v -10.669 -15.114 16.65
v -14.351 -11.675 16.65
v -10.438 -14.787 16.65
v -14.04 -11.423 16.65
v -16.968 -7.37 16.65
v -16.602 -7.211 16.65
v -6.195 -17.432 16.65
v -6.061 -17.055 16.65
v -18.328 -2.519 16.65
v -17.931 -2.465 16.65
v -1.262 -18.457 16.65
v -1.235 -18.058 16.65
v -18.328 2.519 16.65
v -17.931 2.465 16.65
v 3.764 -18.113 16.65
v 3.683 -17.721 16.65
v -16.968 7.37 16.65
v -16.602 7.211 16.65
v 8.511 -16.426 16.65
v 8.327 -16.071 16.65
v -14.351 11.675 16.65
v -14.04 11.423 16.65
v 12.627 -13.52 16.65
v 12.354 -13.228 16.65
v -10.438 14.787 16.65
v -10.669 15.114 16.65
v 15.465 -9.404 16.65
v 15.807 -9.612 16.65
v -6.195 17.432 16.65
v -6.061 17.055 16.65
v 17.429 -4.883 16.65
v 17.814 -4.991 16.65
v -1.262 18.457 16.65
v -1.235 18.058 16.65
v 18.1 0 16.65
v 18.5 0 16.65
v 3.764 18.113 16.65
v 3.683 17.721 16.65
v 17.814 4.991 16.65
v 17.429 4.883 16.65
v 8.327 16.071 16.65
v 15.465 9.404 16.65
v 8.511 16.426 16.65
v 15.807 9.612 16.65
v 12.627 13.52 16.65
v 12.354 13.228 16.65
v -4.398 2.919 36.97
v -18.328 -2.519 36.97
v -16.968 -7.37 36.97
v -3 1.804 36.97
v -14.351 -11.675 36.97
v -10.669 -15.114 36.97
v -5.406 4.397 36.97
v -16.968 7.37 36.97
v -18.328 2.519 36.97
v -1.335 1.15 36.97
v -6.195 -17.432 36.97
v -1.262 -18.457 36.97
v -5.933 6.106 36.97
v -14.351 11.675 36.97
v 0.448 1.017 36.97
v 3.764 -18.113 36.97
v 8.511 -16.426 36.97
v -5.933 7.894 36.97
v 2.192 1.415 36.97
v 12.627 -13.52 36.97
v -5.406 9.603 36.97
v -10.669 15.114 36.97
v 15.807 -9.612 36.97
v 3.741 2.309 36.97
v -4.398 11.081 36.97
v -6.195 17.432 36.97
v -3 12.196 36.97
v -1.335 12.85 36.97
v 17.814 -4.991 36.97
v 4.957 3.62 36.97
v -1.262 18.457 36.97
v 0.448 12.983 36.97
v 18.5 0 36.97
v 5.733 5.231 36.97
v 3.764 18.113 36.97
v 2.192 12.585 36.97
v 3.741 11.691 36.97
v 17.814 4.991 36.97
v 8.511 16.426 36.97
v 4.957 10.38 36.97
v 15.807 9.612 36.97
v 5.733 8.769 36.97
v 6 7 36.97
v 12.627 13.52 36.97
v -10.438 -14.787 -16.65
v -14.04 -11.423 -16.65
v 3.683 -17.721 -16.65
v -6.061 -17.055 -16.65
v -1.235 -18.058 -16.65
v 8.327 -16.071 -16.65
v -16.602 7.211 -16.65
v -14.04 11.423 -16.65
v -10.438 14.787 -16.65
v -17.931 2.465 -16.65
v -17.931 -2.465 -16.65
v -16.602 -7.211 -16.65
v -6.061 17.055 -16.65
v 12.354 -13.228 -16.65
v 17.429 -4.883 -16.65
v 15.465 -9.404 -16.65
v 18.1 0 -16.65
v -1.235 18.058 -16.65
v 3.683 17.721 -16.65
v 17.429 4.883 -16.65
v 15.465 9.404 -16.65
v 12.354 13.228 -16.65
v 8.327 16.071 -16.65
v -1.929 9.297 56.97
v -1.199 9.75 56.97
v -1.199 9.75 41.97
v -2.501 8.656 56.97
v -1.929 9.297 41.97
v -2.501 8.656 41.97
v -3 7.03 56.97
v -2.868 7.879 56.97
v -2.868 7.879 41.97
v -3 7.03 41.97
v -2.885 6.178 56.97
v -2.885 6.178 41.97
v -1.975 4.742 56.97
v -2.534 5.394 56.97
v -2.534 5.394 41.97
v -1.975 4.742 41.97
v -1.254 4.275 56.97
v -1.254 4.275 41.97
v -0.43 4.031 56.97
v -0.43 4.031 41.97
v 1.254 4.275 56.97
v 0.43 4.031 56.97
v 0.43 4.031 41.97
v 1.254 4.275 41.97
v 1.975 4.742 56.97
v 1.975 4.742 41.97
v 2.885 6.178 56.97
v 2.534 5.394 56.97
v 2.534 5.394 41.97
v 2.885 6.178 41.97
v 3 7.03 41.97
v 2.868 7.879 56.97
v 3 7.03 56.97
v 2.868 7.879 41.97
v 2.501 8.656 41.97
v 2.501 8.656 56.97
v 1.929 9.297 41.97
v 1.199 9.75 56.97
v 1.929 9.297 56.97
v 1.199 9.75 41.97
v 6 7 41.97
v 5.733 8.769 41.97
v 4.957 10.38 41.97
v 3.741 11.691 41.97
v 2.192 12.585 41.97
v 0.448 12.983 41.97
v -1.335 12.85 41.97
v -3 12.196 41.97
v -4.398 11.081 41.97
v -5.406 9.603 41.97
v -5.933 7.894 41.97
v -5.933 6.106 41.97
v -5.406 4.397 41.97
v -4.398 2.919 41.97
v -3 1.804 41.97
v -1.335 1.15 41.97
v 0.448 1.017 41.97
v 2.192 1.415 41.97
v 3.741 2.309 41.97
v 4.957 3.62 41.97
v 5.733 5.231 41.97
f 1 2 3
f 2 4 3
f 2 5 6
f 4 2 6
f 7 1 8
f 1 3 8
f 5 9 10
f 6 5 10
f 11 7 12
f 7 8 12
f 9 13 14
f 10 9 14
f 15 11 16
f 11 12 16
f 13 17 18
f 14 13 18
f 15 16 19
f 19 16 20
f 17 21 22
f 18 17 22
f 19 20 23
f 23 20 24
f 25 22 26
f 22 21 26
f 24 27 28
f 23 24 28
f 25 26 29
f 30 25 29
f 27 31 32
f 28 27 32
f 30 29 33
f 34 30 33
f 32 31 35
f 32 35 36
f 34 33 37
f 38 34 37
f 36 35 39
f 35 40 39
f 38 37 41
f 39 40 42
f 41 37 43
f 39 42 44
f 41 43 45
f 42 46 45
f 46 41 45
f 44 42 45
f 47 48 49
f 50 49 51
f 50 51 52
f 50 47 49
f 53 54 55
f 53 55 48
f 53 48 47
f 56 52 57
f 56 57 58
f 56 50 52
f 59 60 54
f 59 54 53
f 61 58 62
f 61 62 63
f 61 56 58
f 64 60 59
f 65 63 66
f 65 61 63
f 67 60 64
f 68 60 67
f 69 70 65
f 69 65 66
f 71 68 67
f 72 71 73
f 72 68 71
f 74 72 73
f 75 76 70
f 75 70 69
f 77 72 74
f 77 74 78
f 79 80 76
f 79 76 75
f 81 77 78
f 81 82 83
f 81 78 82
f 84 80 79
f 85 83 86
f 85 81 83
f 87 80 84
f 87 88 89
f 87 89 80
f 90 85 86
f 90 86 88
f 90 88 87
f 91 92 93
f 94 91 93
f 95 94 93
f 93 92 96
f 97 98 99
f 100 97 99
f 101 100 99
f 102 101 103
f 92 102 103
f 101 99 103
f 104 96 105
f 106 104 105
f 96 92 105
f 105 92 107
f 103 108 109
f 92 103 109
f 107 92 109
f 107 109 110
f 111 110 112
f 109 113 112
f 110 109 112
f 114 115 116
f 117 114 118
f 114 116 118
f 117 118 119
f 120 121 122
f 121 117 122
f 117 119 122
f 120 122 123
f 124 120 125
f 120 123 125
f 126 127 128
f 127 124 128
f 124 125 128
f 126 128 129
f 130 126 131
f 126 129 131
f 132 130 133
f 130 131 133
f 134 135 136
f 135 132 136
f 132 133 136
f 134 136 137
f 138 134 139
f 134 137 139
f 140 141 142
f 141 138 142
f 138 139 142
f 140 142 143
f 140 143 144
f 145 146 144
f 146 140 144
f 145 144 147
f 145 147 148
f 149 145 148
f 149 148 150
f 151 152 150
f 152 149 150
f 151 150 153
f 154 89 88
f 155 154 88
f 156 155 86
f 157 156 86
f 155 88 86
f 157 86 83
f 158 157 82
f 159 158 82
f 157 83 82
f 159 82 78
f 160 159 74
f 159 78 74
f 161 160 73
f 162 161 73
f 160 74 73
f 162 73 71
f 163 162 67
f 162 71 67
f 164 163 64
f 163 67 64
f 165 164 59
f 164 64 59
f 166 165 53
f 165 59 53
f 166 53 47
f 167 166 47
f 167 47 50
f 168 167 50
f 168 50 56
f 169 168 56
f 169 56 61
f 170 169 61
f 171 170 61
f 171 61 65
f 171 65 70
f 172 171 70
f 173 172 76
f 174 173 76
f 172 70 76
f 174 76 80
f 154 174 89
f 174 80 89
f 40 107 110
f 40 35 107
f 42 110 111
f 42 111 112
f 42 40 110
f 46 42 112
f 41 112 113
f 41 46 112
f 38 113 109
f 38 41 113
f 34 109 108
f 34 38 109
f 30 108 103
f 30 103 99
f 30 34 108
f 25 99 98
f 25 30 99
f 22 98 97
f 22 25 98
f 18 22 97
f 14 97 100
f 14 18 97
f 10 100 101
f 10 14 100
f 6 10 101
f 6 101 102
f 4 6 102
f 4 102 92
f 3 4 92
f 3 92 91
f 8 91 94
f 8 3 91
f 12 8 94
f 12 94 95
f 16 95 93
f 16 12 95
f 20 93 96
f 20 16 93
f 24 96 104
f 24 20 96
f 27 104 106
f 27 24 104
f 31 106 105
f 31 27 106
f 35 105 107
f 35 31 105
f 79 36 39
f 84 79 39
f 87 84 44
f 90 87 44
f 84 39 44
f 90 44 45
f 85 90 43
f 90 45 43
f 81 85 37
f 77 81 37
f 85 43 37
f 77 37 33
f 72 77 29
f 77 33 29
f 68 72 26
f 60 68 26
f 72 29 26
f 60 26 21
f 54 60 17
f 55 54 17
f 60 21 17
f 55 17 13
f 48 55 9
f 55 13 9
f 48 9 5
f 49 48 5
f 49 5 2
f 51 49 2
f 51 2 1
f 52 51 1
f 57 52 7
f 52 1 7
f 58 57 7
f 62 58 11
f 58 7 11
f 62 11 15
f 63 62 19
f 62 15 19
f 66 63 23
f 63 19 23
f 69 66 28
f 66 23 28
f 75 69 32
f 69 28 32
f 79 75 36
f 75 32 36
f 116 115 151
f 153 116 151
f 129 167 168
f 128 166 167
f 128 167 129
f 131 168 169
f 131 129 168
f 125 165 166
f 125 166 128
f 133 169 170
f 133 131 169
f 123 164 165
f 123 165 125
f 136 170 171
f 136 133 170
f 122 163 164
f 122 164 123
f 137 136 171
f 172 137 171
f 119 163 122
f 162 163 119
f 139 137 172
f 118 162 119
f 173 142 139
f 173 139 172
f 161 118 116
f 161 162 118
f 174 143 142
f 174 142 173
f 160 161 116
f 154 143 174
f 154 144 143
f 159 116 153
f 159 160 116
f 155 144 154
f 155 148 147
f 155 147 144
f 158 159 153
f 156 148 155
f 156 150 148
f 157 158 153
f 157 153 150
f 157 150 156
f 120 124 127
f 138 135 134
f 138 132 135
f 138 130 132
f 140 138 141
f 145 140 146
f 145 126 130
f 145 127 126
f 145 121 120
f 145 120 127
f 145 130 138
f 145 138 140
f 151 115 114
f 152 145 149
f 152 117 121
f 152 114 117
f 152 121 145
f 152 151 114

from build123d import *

# Parameters (mm, degrees)
SKETCH1_R           = 18.1
BOSS_EXTRUDE1_DEPTH = 16.65
SKETCH2_R           = 18.5
BOSS_EXTRUDE2_DEPTH = 20.32
SKETCH3_R           = 5.999999938
BOSS_EXTRUDE3_DEPTH = 5
SKETCH4_R           = 3
BOSS_EXTRUDE4_DEPTH = 15
SKETCH5_W           = 2.397915762
SKETCH5_H           = 1.769215018
CUT_EXTRUDE1_DEPTH  = 15


with BuildPart() as part:
    # Sketch1 → Boss-Extrude1 (new, symmetric)
    with BuildSketch(Plane.XY):
        Circle(SKETCH1_R)
    extrude(amount=BOSS_EXTRUDE1_DEPTH, both=True)

    # Sketch2 → Boss-Extrude2 (add)
    with BuildSketch(Plane.XY.offset(16.65)):
        Circle(SKETCH2_R)
    extrude(amount=BOSS_EXTRUDE2_DEPTH)

    # Sketch3 → Boss-Extrude3 (add)
    with BuildSketch(Plane.XY.offset(36.97)):
        with Locations((0, 7)):
            Circle(SKETCH3_R)
    extrude(amount=BOSS_EXTRUDE3_DEPTH)

    # Sketch4 → Boss-Extrude4 (add)
    with BuildSketch(Plane.XY.offset(41.97)):
        with Locations((0, 7)):
            Circle(SKETCH4_R)
    extrude(amount=BOSS_EXTRUDE4_DEPTH)

    # Sketch5 → Cut-Extrude1 (cut)
    with BuildSketch(Plane.XY.offset(56.97)):
        with Locations((0, 10.634607509)):
            Rectangle(SKETCH5_W, SKETCH5_H)
    extrude(amount=-CUT_EXTRUDE1_DEPTH, mode=Mode.SUBTRACT)


solid = part.part
